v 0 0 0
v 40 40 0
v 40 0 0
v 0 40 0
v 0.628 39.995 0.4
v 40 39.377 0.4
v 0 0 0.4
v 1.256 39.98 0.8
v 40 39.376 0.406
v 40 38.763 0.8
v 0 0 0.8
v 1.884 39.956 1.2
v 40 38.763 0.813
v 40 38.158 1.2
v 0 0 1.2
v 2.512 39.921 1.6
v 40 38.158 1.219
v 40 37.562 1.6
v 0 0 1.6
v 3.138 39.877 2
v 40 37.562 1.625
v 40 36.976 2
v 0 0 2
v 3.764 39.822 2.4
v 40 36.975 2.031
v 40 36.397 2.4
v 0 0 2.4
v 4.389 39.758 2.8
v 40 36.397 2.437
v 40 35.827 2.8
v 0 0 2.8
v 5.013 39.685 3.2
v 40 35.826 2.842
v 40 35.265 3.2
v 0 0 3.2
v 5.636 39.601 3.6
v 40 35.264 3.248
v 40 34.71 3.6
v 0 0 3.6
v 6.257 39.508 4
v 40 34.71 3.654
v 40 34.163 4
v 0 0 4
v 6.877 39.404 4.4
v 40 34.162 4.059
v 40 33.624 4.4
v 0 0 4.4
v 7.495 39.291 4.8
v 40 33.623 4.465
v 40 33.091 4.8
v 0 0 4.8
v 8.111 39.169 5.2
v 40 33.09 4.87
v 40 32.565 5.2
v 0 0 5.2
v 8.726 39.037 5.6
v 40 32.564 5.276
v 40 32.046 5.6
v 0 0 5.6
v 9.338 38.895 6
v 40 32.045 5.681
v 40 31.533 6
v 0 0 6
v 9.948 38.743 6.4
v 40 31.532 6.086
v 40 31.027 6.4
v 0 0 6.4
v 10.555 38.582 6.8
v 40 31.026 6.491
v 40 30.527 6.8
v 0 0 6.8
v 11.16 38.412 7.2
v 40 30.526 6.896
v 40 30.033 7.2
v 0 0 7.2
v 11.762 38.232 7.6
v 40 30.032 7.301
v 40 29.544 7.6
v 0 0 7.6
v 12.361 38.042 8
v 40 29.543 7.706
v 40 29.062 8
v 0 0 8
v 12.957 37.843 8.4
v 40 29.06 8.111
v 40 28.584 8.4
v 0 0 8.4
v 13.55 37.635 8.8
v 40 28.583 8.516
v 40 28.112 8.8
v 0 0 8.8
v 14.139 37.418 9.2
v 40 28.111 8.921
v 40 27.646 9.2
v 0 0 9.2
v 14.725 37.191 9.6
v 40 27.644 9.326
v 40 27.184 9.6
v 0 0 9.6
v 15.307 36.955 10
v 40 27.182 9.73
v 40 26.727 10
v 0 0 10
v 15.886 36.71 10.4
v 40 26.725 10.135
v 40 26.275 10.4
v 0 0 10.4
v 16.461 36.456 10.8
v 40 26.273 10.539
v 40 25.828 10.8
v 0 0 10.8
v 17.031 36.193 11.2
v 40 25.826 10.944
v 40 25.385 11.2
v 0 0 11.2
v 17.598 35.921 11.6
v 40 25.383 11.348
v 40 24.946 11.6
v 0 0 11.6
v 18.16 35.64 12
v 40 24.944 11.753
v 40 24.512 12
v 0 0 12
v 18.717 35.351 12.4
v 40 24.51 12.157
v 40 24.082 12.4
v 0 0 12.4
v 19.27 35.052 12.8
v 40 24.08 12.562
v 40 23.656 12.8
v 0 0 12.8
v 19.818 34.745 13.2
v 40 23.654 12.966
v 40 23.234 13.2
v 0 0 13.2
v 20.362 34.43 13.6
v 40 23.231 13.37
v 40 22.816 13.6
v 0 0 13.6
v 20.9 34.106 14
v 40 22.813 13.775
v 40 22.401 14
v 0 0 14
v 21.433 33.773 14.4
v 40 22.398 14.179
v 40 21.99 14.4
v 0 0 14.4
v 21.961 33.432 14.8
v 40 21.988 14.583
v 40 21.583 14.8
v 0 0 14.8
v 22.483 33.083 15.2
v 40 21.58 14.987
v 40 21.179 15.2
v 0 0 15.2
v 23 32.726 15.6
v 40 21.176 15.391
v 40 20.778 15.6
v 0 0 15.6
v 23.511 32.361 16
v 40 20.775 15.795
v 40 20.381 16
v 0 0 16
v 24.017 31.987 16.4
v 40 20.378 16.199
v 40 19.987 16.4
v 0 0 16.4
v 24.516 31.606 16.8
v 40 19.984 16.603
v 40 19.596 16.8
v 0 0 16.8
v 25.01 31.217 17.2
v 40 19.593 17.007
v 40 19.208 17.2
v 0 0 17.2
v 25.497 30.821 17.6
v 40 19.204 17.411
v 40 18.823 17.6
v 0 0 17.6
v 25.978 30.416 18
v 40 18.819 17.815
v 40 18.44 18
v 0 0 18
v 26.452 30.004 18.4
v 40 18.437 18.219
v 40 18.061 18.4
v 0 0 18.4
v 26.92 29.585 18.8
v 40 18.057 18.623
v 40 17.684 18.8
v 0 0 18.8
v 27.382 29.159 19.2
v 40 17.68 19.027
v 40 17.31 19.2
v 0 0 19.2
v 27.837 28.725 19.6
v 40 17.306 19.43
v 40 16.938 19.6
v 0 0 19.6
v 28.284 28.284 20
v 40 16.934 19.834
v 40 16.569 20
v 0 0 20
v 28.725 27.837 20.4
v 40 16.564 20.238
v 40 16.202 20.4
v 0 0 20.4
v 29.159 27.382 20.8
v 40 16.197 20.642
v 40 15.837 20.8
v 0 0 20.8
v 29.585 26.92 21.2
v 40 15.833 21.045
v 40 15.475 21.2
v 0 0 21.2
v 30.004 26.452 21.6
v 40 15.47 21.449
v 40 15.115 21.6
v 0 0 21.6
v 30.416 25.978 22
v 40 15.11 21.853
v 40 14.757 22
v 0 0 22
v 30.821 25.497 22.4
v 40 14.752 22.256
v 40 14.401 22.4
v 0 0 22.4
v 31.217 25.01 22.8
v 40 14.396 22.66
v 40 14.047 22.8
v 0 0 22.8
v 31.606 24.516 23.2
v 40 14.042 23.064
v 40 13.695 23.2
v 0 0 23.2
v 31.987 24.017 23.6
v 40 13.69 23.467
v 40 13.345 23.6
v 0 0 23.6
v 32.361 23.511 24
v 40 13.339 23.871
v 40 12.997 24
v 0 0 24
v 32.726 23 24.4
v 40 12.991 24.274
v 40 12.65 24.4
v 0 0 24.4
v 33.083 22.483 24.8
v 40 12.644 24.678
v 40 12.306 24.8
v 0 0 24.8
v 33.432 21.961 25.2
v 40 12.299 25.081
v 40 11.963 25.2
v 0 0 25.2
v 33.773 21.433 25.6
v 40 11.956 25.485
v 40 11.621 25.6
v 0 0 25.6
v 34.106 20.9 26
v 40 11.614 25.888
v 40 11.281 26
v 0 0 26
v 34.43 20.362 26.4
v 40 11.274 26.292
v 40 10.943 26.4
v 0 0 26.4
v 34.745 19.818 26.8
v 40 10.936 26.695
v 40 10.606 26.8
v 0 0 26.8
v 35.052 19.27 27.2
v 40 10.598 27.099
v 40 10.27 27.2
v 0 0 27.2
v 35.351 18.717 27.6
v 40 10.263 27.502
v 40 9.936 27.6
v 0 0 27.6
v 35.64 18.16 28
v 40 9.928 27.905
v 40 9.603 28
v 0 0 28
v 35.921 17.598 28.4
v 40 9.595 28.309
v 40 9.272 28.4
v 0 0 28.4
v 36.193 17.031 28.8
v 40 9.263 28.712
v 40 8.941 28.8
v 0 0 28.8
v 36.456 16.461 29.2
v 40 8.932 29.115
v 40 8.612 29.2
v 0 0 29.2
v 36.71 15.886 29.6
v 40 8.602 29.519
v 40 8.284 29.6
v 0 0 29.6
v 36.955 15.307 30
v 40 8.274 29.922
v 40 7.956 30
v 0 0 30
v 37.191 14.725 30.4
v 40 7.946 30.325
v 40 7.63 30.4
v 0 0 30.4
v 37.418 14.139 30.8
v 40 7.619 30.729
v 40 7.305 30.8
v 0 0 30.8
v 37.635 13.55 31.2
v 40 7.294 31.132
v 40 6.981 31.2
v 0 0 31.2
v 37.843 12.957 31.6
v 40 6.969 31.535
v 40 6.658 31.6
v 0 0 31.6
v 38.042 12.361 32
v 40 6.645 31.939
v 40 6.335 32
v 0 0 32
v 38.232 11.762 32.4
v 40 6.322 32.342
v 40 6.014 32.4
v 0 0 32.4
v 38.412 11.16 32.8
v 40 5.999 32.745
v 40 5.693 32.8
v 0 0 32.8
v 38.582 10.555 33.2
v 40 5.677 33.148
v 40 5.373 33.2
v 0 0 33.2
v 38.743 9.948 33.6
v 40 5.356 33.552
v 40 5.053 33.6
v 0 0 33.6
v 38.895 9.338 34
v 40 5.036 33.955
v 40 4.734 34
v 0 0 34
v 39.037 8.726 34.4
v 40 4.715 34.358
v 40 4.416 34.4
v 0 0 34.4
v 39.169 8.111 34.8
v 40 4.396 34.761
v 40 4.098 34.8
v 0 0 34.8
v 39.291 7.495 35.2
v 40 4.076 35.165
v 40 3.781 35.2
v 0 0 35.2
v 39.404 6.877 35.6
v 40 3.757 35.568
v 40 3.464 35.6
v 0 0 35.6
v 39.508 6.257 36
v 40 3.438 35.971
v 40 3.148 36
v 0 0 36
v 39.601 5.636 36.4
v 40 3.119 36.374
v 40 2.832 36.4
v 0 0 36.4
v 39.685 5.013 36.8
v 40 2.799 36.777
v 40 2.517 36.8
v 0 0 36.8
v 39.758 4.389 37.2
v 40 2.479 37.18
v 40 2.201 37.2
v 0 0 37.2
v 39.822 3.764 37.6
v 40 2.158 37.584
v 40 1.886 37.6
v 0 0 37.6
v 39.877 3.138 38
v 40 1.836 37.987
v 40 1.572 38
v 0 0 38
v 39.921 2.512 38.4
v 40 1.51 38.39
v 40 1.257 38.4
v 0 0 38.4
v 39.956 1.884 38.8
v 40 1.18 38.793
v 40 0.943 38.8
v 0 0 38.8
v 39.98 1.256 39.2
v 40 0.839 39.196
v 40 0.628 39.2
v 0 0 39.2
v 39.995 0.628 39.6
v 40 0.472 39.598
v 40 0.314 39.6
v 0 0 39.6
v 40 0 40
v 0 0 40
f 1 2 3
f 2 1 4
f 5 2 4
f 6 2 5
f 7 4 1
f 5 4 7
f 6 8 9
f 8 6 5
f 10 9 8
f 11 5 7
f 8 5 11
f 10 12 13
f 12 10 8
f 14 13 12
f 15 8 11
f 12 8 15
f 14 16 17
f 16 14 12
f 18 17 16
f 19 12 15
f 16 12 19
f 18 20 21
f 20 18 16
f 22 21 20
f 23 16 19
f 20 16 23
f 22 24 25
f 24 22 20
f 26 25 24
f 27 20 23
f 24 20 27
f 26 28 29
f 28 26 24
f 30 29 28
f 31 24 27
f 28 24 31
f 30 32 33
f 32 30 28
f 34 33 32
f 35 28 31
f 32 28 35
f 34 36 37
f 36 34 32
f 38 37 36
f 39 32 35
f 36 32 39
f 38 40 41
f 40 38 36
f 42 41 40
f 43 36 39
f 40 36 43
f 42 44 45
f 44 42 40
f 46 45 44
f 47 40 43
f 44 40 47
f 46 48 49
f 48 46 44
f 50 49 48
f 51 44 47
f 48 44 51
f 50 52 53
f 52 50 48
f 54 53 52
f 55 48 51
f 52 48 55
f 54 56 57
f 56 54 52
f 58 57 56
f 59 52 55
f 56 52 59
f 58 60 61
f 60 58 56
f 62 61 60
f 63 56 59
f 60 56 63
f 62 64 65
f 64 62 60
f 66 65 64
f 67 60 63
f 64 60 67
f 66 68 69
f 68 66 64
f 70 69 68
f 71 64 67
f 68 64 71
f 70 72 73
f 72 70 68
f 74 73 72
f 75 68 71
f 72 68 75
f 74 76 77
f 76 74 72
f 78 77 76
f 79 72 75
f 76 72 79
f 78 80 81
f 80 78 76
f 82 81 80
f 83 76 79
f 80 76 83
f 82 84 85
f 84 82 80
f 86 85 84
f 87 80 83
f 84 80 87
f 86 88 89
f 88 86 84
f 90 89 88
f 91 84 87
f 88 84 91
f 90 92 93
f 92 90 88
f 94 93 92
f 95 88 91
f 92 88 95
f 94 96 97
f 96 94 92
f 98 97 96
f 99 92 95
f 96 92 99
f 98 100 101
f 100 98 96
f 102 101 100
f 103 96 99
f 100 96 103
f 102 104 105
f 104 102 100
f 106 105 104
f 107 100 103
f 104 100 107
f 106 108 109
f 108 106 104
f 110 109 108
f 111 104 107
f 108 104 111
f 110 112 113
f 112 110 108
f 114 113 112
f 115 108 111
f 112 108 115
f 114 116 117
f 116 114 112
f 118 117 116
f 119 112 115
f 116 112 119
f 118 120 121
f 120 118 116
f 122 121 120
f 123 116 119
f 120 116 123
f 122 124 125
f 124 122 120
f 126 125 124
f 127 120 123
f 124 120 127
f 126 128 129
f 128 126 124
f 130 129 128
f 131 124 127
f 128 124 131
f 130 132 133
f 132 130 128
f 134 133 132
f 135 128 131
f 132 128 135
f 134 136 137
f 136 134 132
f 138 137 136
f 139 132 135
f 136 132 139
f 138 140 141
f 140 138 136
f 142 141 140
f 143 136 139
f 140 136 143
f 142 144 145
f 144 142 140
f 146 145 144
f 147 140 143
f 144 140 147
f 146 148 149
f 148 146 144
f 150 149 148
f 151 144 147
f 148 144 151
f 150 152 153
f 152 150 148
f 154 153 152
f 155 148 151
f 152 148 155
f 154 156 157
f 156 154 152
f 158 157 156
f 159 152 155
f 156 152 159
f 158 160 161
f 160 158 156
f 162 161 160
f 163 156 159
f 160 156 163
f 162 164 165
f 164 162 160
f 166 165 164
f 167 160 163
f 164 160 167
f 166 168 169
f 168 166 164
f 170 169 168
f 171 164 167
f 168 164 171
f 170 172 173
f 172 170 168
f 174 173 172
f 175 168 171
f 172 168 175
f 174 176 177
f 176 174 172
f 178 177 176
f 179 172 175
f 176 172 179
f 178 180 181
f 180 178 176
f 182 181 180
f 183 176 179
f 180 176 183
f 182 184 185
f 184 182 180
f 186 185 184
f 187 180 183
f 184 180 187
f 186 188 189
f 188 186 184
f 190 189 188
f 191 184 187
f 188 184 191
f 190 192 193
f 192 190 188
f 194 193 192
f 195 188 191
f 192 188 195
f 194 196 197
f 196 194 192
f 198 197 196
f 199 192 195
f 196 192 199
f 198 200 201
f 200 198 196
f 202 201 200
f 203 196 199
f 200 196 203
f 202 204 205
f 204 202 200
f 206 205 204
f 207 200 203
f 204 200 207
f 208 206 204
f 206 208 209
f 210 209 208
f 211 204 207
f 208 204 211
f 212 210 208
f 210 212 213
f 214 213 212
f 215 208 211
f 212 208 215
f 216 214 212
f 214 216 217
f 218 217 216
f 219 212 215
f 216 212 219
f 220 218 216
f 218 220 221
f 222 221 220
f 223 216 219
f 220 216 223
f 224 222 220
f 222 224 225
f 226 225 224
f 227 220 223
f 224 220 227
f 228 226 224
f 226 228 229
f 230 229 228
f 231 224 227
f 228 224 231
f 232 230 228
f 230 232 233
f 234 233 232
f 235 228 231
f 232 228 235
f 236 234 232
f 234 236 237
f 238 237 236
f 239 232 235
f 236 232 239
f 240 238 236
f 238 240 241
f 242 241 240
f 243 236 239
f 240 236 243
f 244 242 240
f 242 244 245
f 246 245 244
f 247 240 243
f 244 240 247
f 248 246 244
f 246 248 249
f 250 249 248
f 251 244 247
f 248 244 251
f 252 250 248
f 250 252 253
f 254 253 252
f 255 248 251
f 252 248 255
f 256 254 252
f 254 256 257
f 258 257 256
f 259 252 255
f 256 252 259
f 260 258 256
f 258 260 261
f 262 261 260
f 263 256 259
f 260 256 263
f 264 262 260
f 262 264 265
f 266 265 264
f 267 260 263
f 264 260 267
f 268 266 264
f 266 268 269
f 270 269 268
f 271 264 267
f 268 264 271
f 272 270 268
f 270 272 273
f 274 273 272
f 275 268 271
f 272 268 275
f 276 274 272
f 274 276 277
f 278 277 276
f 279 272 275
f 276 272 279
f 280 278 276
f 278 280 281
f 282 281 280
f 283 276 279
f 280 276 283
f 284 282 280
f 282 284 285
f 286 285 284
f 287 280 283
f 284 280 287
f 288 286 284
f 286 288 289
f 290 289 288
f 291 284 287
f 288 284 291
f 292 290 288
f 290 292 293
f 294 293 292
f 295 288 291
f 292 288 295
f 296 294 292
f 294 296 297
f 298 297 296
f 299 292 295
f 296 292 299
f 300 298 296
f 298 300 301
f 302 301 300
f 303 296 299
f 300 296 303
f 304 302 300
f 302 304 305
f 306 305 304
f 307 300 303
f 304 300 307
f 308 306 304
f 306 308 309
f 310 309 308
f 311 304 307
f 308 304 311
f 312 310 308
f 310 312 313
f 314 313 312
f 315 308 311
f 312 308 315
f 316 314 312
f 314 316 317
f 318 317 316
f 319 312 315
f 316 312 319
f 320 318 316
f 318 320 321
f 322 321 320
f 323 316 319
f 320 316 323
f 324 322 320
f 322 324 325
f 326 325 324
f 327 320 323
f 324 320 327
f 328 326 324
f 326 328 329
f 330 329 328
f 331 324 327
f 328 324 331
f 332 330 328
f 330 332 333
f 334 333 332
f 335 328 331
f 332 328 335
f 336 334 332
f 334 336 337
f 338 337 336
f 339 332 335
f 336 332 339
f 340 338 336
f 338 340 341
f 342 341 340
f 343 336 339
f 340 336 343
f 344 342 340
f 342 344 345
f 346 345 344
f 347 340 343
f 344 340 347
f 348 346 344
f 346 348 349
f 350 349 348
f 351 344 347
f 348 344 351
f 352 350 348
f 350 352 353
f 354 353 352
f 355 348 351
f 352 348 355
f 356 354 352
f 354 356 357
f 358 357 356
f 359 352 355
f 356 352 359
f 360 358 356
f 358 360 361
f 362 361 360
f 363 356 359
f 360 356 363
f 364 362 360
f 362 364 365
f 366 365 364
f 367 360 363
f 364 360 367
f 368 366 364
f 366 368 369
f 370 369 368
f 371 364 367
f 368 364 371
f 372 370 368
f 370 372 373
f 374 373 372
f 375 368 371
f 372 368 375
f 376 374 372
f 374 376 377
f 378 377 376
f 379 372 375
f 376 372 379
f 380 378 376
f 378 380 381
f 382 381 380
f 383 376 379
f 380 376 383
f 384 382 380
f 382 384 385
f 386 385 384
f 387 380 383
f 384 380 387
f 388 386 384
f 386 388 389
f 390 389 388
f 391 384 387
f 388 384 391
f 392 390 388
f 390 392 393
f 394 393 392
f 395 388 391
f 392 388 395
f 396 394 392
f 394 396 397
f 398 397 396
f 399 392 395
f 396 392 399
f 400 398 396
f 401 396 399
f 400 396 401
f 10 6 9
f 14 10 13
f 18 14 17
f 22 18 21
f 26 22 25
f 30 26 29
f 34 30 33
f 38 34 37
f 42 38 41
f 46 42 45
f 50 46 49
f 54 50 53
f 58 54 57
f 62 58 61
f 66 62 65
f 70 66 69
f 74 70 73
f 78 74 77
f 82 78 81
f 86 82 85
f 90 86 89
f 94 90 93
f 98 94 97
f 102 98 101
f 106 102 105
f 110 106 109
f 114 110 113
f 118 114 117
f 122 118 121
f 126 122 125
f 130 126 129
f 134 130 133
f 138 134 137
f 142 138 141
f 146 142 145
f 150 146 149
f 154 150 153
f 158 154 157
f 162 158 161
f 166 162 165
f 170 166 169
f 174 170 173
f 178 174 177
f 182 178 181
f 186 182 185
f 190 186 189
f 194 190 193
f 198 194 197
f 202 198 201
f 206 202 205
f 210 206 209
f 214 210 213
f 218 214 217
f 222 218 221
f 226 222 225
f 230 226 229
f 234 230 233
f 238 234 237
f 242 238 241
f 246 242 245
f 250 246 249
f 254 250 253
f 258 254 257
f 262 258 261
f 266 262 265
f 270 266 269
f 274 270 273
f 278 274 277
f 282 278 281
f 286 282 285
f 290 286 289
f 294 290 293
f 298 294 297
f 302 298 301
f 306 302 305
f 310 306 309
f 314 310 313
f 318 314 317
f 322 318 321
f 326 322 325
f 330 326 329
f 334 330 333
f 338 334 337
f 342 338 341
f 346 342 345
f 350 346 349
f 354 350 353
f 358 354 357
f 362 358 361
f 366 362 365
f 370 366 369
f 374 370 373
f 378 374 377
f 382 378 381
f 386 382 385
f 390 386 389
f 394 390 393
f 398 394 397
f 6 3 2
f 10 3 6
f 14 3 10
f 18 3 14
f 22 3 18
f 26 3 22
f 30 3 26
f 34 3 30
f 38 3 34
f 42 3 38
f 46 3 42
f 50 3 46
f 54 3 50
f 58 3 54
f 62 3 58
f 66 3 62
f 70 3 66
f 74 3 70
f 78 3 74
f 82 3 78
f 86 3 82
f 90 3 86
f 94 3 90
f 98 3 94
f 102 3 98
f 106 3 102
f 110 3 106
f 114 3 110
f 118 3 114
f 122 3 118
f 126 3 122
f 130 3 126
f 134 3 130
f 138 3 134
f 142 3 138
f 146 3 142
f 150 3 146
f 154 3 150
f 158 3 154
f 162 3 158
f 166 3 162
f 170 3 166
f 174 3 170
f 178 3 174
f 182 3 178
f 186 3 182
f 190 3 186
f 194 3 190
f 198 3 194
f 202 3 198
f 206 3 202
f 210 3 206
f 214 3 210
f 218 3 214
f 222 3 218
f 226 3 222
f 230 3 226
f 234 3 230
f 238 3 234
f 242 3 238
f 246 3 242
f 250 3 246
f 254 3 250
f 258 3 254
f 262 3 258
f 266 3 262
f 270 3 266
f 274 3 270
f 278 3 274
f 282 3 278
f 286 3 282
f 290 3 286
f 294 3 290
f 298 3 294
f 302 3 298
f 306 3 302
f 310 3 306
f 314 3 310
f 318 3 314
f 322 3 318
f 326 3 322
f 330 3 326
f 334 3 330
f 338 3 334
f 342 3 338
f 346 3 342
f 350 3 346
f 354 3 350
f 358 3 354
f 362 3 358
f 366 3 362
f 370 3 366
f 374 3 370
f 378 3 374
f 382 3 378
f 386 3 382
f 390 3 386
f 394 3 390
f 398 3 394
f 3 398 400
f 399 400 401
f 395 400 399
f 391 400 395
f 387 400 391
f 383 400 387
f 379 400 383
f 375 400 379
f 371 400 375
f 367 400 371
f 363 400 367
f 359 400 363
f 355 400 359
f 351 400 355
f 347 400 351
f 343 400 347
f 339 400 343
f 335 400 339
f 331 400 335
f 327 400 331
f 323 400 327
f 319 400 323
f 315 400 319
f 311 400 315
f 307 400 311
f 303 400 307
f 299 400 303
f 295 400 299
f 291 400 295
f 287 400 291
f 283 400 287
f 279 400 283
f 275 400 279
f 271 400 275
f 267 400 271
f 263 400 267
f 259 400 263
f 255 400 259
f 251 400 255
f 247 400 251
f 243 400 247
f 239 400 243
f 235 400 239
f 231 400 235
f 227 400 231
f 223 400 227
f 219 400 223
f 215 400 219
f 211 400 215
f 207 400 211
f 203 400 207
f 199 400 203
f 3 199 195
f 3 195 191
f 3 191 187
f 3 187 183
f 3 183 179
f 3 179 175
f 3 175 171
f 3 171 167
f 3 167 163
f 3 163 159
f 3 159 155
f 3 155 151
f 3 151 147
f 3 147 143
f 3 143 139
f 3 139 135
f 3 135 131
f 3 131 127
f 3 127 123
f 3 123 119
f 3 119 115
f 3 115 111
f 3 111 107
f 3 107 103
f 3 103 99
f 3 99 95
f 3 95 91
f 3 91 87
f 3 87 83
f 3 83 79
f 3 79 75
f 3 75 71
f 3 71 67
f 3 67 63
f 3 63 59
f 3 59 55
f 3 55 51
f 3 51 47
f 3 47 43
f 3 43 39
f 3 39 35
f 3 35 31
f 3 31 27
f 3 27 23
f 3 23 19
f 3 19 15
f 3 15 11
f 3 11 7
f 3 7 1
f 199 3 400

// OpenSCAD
intersection() {
	linear_extrude(height=40, twist=90, $fn=400) {
		square(40);
	}
	cube(40);
}
